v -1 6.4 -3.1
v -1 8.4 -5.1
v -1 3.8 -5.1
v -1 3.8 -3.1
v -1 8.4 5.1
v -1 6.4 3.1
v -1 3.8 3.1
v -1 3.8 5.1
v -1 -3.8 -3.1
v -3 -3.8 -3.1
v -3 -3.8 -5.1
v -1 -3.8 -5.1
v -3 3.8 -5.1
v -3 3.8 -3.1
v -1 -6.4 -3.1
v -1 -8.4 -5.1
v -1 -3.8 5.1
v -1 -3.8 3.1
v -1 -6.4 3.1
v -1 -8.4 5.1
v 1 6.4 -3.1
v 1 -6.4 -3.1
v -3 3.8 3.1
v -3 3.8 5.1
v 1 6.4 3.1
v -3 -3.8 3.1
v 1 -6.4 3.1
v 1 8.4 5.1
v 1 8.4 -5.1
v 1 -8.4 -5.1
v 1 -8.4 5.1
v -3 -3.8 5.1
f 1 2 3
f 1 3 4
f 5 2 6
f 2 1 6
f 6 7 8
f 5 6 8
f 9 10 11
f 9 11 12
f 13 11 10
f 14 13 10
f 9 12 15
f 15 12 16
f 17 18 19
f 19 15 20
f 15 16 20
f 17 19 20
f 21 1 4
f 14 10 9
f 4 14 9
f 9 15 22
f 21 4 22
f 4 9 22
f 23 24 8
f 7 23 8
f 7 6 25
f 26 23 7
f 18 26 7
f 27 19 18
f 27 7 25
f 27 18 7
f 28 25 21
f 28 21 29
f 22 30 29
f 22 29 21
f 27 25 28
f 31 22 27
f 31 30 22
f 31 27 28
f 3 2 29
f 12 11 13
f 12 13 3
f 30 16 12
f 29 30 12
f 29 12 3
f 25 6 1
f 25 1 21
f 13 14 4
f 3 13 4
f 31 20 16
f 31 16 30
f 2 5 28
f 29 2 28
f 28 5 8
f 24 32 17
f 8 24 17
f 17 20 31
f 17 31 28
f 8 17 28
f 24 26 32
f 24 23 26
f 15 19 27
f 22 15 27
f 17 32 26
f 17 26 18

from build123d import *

# Parameters (mm, degrees)
SKETCH063_W      = 2
SKETCH063_H      = 2
EXTRUDE068_DEPTH = 3.8
SKETCH062_W      = 2
SKETCH062_H      = 6.2
EXTRUDE067_DEPTH = 6.4
SKETCH061_W      = 2
SKETCH061_H      = 10.2
EXTRUDE066_DEPTH = 8.4


with BuildPart() as extrude_blocchi_tra_switch:
    # Sketch063 → Extrude068 (new body, symmetric)
    with BuildSketch(Plane.XZ):
        with Locations((-2, 4.1)):
            Rectangle(SKETCH063_W, SKETCH063_H)
        with Locations((-2, -4.1)):
            Rectangle(SKETCH063_W, SKETCH063_H)
    extrude(amount=EXTRUDE068_DEPTH, both=True)


with BuildPart() as extrude_struttura_interna_blocco_switch:
    # Sketch062 → Extrude067 (new body, symmetric)
    with BuildSketch(Plane.XZ):
        Rectangle(SKETCH062_W, SKETCH062_H)
    extrude(amount=EXTRUDE067_DEPTH, both=True)


with BuildPart() as fusion_blocco_switch:
    # Sketch061 → Extrude066 (new body, symmetric)
    with BuildSketch(Plane.XZ):
        Rectangle(SKETCH061_W, SKETCH061_H)
    extrude(amount=EXTRUDE066_DEPTH, both=True)

    # Cut036: cut Extrude struttura interna blocco switch
    add(extrude_struttura_interna_blocco_switch.part, mode=Mode.SUBTRACT)

    # Fusion002: union Extrude blocchi tra switch
    add(extrude_blocchi_tra_switch.part)


solid = fusion_blocco_switch.part
